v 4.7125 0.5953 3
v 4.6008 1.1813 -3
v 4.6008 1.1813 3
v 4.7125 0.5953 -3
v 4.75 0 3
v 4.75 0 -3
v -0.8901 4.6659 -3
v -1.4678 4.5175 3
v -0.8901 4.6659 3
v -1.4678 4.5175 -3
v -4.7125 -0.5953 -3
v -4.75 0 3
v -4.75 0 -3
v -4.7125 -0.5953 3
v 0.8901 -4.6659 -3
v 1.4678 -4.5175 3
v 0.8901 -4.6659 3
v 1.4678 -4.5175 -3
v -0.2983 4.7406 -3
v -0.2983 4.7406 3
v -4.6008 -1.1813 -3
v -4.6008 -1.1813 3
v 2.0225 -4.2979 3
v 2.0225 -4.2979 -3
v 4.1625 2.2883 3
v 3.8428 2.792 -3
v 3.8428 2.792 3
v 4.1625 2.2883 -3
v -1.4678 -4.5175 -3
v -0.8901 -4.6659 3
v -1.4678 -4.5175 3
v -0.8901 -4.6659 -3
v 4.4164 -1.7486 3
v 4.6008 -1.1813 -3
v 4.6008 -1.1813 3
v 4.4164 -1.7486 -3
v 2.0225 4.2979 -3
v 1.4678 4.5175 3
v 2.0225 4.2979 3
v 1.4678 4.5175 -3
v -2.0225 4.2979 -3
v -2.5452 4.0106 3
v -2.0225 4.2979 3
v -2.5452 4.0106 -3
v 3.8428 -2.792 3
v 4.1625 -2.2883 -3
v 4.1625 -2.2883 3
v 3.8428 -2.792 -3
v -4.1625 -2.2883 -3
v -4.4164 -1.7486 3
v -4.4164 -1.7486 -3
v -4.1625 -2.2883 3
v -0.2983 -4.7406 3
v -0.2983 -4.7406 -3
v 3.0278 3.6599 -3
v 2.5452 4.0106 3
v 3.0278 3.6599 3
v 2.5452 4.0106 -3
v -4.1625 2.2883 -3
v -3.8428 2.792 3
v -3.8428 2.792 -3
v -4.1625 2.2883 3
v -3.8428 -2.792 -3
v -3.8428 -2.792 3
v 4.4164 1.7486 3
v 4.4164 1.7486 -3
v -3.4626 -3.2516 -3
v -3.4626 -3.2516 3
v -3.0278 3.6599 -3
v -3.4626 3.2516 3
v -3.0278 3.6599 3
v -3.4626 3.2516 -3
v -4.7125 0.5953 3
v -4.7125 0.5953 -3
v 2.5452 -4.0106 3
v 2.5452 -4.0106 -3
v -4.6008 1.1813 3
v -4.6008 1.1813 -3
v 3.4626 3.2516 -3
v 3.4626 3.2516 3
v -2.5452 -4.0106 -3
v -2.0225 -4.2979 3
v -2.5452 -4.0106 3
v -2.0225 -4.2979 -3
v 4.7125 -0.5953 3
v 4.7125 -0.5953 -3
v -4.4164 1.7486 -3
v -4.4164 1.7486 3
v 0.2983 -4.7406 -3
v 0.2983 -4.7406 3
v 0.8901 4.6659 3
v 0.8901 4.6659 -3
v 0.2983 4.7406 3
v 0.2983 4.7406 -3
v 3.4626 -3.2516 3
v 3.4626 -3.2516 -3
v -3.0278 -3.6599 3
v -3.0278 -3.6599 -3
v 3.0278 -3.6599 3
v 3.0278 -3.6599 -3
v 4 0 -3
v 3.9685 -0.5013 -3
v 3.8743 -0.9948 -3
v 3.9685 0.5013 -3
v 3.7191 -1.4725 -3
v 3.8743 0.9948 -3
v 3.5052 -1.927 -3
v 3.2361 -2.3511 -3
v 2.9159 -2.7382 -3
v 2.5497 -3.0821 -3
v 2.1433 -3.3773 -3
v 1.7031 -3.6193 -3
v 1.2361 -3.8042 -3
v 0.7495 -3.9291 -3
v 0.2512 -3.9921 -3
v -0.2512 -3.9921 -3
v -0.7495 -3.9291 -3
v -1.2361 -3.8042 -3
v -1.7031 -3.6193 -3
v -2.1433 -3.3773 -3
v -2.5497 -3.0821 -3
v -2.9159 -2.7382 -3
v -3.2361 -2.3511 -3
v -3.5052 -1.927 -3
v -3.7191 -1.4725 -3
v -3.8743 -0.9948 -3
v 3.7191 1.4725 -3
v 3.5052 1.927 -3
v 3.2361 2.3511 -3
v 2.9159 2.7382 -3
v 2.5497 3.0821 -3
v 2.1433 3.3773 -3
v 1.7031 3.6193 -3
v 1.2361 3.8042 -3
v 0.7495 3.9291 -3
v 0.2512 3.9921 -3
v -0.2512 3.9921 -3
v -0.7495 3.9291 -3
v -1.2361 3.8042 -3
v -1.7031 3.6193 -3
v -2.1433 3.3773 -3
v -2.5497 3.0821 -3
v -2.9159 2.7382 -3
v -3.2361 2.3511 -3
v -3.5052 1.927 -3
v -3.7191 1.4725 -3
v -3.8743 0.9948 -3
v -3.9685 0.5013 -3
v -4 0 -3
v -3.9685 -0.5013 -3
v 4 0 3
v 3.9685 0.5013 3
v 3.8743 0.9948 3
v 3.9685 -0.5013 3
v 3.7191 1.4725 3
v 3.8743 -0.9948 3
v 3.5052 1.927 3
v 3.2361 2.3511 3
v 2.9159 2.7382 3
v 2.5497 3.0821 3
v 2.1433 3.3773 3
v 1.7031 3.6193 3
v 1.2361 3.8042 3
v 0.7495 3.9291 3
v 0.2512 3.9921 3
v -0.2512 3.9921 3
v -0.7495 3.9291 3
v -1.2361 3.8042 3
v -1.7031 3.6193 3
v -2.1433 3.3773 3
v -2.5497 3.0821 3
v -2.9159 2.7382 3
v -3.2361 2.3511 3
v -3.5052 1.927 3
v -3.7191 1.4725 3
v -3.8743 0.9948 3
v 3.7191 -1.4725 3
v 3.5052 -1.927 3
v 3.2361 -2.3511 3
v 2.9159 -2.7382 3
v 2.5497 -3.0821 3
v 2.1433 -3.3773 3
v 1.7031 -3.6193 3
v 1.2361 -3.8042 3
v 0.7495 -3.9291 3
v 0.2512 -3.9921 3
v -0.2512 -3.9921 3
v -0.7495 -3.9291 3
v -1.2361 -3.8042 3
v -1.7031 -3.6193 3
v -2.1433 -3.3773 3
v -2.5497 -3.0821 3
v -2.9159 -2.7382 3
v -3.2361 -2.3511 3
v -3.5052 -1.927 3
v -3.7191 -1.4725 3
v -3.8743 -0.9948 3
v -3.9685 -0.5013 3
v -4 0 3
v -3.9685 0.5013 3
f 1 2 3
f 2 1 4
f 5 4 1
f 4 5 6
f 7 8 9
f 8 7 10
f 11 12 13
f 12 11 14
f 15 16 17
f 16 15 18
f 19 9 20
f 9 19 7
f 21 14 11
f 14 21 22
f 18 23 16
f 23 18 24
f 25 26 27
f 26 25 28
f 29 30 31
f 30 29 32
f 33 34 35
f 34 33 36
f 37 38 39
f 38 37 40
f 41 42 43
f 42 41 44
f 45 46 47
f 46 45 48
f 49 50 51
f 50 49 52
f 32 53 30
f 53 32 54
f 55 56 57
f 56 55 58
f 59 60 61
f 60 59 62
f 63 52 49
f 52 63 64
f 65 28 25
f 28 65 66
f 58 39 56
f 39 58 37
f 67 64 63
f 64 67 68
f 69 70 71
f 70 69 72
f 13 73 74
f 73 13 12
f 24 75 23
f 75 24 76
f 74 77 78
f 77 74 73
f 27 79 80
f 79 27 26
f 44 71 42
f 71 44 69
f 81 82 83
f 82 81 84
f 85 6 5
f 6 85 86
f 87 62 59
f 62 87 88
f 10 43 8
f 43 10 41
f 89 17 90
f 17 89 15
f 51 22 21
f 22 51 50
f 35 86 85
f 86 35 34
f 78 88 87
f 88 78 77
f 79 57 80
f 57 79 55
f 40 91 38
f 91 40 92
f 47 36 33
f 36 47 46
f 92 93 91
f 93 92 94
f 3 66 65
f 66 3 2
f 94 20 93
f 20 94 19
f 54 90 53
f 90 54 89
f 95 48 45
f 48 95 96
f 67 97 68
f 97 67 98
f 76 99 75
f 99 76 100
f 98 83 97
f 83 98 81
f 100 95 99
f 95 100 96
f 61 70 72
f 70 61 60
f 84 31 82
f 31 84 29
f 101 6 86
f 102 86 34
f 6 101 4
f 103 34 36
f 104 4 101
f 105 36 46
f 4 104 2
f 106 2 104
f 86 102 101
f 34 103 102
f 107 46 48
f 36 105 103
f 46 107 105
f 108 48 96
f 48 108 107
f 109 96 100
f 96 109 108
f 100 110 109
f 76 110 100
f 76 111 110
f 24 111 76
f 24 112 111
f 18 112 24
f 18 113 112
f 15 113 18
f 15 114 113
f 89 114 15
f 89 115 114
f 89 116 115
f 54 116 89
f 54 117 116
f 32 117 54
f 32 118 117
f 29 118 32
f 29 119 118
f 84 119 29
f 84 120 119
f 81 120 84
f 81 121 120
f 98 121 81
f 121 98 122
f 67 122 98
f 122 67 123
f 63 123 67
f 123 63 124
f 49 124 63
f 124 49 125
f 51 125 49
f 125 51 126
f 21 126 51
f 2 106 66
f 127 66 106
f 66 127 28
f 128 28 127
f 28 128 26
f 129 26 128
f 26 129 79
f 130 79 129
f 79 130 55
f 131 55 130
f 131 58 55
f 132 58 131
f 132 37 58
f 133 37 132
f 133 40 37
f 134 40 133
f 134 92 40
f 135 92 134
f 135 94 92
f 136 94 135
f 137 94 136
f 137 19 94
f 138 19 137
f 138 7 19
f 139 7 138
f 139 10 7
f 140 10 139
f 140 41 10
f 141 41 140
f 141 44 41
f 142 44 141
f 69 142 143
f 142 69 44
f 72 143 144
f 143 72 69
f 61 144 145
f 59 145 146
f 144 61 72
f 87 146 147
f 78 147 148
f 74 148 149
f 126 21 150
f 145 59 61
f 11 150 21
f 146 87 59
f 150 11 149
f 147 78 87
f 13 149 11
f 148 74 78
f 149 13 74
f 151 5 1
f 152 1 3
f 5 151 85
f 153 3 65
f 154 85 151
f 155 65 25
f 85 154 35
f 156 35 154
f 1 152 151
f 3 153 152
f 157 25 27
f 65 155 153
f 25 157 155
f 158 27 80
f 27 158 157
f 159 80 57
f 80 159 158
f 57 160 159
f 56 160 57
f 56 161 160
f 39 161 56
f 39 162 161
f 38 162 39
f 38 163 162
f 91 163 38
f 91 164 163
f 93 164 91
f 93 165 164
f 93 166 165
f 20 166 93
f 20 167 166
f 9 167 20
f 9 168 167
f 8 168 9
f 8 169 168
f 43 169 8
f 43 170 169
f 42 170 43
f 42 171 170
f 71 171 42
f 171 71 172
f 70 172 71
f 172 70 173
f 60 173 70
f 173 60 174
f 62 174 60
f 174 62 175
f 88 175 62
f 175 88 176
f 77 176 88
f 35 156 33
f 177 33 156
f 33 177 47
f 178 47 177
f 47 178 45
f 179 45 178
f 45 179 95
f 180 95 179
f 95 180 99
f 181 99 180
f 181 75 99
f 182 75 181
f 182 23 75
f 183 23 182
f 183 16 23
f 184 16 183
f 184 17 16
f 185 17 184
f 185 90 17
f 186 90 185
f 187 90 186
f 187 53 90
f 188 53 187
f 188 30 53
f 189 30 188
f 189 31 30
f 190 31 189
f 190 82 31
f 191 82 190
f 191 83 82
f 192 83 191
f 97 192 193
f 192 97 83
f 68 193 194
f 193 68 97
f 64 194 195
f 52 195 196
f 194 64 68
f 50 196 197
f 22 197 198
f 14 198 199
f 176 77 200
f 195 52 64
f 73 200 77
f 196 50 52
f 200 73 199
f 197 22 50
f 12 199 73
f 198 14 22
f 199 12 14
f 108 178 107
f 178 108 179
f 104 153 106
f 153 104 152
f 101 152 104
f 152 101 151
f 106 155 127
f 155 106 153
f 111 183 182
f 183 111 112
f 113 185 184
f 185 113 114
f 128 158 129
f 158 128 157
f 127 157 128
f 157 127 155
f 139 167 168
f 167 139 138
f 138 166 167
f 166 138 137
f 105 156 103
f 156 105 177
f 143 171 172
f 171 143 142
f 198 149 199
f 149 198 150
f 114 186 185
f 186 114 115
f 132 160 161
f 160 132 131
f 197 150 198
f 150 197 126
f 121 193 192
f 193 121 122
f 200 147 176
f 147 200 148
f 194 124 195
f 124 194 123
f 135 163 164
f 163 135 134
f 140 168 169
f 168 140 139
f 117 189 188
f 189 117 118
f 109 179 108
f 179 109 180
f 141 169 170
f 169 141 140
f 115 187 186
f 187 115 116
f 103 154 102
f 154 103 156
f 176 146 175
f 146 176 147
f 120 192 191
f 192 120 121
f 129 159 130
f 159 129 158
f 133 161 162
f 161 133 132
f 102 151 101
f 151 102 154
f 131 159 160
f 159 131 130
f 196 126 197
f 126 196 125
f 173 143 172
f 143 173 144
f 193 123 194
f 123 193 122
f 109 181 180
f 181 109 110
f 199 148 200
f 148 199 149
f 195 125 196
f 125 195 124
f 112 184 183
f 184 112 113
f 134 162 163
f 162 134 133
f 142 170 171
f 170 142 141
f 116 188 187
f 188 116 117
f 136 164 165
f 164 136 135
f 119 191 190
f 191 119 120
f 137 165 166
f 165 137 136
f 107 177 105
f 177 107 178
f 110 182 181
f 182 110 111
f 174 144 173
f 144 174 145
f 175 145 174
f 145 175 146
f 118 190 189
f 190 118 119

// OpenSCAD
$fn = 50;


difference() {
	union() {
		translate(v = [0, 0, -3.0000000000]) {
			cylinder(h = 6, r = 4.7500000000);
		}
	}
	union() {
		translate(v = [0, 0, -100.0000000000]) {
			cylinder(h = 200, r = 4.0000000000);
		}
	}
}
